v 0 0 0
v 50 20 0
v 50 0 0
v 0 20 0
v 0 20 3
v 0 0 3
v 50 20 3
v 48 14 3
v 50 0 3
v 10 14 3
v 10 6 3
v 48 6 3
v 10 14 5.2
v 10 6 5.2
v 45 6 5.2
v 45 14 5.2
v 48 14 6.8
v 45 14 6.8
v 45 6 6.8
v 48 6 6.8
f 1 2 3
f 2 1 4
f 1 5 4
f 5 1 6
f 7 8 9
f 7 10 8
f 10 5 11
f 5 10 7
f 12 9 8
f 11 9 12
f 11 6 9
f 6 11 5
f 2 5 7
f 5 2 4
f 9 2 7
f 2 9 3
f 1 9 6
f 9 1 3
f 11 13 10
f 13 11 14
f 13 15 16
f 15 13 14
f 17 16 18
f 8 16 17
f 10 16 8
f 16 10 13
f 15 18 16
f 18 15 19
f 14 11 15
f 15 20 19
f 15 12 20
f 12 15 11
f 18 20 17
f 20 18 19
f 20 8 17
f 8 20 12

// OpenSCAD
/*
  Cantilever snap-fit coupon.
*/
base = [50,20,3];
arm_len = 35; arm_w = 8; arm_t = 2.2; hook_h = 1.6;
linear_extrude(height=base[2]) square([base[0], base[1]]);
translate([10,(base[1]-arm_w)/2, base[2]]) linear_extrude(height=arm_t) square([arm_len, arm_w]);
translate([10+arm_len,(base[1]-arm_w)/2, base[2]]) linear_extrude(height=arm_t+hook_h) square([3, arm_w]);
